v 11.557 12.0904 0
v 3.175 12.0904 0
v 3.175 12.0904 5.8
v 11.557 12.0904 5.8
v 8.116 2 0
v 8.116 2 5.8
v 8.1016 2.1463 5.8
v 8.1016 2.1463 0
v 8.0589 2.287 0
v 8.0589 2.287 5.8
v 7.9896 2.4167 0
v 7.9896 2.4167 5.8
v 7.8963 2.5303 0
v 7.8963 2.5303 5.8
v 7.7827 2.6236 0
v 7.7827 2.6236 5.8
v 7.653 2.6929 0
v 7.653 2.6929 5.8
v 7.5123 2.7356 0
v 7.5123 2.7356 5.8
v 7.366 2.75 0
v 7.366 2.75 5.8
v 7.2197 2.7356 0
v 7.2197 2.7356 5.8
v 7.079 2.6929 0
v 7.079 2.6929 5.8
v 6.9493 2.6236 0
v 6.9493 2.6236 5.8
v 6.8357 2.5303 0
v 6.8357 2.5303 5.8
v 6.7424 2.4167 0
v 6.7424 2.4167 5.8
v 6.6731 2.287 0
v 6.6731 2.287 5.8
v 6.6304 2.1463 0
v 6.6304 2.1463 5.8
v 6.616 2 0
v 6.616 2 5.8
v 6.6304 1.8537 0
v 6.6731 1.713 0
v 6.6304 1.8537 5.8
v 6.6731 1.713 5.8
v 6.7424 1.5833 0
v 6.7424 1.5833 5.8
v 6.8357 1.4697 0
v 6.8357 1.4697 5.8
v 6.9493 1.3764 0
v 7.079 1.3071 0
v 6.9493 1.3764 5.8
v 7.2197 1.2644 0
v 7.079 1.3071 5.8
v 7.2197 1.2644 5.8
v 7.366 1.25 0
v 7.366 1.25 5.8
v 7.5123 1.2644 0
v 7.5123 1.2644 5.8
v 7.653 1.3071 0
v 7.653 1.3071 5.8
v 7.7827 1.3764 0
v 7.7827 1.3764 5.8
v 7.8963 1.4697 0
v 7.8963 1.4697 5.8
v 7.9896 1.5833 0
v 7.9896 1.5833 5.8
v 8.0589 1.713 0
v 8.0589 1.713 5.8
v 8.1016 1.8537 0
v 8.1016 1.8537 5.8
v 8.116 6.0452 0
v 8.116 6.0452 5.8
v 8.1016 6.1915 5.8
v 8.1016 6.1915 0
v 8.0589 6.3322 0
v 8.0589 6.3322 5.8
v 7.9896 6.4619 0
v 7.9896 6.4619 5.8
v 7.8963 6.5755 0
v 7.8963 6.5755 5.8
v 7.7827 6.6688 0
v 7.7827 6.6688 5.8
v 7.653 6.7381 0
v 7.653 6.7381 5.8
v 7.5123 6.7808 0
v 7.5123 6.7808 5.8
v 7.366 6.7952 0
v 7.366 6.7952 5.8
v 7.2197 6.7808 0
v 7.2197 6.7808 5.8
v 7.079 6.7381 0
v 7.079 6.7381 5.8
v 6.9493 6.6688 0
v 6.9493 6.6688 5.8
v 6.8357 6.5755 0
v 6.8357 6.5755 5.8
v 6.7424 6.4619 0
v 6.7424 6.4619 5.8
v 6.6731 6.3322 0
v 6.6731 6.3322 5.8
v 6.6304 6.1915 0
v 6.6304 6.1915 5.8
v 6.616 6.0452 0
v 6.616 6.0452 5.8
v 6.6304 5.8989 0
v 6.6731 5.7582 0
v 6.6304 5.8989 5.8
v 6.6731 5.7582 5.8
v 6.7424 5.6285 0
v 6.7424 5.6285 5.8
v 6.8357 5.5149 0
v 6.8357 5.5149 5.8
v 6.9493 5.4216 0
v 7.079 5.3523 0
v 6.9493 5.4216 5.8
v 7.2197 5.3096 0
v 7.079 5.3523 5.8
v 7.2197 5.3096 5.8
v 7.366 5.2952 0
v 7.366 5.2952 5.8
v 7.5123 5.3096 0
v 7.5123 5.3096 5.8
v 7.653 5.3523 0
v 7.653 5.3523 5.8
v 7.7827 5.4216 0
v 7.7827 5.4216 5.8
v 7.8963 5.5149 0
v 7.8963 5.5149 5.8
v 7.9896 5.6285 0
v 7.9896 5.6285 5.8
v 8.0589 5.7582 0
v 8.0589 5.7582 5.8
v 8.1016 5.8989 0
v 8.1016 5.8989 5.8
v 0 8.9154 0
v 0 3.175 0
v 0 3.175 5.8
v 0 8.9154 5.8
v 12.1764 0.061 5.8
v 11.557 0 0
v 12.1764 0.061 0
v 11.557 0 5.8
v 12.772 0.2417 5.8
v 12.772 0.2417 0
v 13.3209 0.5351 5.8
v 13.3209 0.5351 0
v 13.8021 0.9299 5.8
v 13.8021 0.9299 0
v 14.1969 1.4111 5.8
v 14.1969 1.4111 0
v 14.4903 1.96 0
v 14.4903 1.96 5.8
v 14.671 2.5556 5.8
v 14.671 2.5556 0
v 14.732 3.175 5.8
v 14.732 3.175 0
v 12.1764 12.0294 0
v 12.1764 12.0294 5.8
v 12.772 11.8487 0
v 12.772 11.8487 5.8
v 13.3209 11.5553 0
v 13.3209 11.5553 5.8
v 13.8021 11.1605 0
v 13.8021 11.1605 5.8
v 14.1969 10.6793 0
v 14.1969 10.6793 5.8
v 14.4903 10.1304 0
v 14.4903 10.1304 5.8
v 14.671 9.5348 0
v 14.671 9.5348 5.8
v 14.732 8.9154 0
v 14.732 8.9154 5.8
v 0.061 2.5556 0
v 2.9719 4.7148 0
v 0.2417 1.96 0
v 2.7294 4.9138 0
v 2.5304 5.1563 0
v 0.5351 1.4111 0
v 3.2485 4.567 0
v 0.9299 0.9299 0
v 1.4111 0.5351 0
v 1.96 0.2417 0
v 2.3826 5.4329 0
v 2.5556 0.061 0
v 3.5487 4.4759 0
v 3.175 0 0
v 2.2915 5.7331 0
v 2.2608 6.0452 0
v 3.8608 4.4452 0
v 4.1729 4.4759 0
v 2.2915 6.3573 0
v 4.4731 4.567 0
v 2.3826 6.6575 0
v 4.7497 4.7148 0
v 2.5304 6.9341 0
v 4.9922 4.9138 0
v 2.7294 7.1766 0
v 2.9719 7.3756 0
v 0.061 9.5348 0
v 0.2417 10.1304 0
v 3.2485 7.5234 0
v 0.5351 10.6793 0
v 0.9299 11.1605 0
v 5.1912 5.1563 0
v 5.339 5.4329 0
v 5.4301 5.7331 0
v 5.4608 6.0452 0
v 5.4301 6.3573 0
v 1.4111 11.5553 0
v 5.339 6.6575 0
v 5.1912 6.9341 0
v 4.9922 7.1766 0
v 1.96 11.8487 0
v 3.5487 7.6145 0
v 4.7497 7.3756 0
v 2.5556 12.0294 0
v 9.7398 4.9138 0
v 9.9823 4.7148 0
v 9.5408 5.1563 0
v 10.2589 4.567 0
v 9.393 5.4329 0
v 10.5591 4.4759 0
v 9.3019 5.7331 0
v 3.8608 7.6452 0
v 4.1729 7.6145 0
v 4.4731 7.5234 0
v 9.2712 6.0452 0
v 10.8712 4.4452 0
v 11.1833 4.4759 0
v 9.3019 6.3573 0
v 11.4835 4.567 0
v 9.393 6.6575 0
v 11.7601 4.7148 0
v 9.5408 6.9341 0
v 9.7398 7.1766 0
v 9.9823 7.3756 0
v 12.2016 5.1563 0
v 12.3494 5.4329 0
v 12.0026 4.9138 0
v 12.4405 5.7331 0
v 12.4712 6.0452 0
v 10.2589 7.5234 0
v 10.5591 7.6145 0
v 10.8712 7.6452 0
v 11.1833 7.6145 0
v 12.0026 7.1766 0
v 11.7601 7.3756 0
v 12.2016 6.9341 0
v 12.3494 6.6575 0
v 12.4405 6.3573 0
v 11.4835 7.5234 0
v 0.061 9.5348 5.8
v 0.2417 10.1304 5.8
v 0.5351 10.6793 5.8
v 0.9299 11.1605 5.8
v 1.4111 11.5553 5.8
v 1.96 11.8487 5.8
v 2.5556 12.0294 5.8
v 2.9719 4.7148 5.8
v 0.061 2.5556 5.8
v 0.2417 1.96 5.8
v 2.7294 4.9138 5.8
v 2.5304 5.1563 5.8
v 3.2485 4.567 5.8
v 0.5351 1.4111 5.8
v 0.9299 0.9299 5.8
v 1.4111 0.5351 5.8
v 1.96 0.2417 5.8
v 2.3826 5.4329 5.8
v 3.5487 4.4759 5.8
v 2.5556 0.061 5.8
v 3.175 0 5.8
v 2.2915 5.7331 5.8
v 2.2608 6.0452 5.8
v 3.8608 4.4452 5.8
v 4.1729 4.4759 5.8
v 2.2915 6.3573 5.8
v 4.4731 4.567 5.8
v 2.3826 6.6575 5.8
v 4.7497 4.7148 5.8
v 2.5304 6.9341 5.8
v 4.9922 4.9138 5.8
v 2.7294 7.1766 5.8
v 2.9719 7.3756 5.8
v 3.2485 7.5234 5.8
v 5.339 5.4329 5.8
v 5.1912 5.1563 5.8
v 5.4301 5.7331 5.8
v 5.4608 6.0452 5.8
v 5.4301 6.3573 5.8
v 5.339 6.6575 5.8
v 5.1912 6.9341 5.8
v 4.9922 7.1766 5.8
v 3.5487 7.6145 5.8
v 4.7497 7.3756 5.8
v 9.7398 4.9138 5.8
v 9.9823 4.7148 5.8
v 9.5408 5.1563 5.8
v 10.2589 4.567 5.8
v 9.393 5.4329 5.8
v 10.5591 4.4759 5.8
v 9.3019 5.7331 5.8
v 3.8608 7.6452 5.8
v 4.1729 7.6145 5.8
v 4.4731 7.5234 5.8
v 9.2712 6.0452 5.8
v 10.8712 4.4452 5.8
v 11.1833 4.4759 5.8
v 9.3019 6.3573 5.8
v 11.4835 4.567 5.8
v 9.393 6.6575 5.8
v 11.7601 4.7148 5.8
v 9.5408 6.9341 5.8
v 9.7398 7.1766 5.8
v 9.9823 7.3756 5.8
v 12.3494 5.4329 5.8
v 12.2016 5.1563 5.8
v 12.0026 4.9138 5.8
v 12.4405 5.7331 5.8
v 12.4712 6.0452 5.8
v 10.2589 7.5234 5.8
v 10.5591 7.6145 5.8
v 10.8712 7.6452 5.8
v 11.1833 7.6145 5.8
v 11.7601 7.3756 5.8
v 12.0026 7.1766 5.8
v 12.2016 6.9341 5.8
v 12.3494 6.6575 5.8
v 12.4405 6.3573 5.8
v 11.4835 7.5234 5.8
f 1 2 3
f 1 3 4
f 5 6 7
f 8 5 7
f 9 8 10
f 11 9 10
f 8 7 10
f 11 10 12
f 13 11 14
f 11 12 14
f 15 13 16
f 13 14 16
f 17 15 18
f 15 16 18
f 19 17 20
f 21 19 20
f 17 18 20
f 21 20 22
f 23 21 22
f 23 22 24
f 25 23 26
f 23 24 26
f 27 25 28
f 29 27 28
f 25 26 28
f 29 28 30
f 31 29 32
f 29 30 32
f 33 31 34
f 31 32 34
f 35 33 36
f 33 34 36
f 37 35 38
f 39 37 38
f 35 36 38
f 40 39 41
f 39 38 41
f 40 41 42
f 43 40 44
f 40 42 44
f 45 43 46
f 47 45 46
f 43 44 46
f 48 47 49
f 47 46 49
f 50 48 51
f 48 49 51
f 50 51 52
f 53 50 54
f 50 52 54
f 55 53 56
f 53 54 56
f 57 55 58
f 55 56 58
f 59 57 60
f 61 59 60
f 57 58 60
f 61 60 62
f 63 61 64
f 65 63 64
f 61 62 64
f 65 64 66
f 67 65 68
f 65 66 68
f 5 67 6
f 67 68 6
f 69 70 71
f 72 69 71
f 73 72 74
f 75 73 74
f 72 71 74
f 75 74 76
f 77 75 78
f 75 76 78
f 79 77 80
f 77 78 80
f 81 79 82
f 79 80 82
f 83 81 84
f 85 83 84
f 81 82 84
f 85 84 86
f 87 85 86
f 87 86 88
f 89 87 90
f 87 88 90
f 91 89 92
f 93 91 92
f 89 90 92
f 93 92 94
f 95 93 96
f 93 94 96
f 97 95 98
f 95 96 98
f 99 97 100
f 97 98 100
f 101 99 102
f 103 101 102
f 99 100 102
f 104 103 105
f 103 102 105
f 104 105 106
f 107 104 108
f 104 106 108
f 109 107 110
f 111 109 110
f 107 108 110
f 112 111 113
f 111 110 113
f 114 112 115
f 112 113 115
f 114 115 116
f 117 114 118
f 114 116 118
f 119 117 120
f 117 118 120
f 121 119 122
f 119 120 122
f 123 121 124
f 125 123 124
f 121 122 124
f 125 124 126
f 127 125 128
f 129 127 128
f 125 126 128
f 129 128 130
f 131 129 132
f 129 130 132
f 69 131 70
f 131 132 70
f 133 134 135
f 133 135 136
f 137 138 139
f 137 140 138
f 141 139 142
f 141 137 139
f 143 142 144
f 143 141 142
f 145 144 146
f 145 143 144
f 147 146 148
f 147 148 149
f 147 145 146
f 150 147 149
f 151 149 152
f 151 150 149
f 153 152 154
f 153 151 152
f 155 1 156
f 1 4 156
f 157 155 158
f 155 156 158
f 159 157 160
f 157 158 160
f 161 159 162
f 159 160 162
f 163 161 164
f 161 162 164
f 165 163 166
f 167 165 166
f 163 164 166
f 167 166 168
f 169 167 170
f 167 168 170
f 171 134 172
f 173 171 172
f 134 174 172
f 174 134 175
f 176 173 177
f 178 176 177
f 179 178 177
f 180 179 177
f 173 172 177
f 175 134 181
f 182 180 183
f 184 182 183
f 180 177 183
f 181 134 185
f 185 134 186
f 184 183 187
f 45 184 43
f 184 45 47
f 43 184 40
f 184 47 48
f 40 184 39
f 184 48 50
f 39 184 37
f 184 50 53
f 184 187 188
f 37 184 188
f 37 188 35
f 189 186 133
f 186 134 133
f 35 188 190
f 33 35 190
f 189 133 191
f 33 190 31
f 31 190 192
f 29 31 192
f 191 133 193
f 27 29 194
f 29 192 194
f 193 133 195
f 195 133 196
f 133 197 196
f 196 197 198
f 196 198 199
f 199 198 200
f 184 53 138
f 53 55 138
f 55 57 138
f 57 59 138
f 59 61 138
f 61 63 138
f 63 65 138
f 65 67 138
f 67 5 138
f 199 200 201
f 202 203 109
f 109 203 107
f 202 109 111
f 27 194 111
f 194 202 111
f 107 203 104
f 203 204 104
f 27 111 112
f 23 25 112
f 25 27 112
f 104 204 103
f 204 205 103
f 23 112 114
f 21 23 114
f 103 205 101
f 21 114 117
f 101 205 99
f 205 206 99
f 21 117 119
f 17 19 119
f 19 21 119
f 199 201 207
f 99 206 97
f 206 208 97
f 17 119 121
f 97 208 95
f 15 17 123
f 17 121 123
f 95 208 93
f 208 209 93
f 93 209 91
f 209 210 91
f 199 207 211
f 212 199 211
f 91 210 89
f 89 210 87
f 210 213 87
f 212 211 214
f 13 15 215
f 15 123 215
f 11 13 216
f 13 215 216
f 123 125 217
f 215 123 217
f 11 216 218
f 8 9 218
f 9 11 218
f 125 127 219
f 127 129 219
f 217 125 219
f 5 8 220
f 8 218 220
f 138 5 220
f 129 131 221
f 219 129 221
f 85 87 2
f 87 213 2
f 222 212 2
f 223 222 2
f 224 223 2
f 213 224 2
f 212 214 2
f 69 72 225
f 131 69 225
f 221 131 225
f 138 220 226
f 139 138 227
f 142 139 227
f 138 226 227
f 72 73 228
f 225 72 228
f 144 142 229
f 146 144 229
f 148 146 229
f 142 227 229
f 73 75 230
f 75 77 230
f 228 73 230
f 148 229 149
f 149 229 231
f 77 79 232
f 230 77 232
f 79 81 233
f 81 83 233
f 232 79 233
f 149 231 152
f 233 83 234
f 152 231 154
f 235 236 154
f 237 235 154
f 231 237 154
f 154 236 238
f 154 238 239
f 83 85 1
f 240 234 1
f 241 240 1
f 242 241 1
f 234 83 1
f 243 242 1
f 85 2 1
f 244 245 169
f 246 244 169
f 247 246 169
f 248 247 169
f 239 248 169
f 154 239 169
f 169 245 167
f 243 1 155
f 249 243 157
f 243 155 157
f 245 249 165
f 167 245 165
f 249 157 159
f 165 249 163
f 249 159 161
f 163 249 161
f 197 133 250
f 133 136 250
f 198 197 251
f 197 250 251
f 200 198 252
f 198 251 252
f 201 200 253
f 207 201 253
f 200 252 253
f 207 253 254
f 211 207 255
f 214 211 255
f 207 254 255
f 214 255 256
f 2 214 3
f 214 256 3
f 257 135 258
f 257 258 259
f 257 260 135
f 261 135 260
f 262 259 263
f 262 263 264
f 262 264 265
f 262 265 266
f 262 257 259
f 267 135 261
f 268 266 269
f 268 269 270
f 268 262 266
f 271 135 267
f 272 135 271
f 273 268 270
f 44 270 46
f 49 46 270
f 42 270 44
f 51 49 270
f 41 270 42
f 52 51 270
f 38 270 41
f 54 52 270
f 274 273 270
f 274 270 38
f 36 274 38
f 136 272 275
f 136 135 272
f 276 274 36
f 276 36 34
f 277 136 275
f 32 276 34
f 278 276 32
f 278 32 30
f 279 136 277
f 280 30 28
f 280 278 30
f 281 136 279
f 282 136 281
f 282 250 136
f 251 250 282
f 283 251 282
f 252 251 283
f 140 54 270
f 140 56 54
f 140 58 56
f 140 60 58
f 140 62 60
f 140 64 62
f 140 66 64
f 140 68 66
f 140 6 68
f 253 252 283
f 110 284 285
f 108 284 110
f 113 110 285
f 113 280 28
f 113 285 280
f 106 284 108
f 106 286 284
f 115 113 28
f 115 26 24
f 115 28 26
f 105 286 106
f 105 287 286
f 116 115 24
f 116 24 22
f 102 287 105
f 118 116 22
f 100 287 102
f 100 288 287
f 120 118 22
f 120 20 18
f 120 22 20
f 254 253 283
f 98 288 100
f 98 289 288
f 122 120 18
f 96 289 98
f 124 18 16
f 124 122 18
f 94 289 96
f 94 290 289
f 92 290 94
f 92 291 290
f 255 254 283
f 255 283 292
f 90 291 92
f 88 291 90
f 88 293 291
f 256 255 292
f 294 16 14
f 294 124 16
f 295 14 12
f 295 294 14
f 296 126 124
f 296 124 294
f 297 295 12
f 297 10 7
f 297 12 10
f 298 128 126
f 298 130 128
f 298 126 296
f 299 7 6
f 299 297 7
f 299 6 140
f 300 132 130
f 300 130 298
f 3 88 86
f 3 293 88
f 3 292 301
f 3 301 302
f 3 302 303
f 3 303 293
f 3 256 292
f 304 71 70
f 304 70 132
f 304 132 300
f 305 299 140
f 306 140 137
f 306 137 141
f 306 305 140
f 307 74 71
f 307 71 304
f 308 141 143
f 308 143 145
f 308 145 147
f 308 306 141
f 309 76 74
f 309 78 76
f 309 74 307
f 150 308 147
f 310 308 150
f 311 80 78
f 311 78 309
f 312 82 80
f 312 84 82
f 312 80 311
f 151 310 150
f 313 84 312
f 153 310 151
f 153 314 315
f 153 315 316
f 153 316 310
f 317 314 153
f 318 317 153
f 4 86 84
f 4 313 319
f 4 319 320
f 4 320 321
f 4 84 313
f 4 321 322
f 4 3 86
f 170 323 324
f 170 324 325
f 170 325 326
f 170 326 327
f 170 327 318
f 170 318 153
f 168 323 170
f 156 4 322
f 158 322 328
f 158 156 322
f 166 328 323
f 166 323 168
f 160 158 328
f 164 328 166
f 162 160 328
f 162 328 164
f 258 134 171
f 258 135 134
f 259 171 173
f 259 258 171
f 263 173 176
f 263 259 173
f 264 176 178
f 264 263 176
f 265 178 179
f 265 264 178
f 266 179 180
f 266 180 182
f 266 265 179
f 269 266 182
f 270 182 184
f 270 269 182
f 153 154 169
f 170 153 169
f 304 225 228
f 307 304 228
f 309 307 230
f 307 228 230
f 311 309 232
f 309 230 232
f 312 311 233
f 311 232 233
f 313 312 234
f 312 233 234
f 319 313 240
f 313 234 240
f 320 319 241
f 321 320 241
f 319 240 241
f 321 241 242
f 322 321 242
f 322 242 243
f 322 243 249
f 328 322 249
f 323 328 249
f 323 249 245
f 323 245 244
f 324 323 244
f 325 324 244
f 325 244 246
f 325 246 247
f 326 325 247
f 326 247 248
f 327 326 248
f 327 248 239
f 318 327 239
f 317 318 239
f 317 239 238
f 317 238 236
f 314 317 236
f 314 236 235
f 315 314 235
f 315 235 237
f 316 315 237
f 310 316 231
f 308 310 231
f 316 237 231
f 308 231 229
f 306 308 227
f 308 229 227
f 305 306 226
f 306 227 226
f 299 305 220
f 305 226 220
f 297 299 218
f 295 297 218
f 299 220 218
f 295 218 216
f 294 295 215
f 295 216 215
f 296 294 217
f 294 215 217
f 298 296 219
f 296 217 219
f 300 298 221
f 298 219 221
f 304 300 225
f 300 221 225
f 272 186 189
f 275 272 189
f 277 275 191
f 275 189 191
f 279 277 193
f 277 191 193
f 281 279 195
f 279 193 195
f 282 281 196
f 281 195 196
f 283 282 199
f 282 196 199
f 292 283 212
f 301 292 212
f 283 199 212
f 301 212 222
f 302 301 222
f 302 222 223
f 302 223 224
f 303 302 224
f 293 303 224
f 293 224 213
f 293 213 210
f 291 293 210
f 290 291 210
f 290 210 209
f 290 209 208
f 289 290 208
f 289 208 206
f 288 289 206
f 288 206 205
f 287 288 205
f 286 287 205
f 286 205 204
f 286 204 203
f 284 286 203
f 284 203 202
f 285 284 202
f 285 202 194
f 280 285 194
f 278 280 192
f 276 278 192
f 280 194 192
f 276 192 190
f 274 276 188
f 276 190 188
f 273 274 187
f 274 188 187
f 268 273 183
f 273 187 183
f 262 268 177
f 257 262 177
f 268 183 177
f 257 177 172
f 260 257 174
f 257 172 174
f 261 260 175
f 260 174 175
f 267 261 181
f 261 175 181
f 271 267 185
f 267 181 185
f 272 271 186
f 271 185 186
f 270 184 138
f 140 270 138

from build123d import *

# Parameters (mm, degrees)
SKETCH1_W                = 14.732
SKETCH1_H                = 12.0904
BOSS_EXTRUDE1_DEPTH      = 5.8
SKETCH2_R                = 0.75
CUT_EXTRUDE1_DEPTH       = 5.8
M3_CLEARANCE_HOLE1_D     = 3.2
M3_CLEARANCE_HOLE1_DEPTH = 36.28
M3_CLEARANCE_HOLE1_TIP   = 0.96137699
FILLET1_R                = 3.175


with BuildPart() as part:
    # Sketch1 → Boss-Extrude1 (new body)
    with BuildSketch(Plane.XY):
        with Locations((7.366, 6.0452)):
            Rectangle(SKETCH1_W, SKETCH1_H)
    extrude(amount=BOSS_EXTRUDE1_DEPTH)

    # Sketch2 → Cut-Extrude1 (cut)
    with BuildSketch(Plane.XY.offset(5.8)):
        with Locations((7.366, 6.0452)):
            Circle(SKETCH2_R)
        with Locations((7.366, 2)):
            Circle(SKETCH2_R)
    extrude(amount=-CUT_EXTRUDE1_DEPTH, mode=Mode.SUBTRACT)

    # M3 Clearance Hole1
    with Locations(Plane.XY.offset(5.8)):
        with Locations((3.8608, 6.0452), (10.8712, 6.0452)):
            Hole(M3_CLEARANCE_HOLE1_D / 2, depth=M3_CLEARANCE_HOLE1_DEPTH)
            with Locations((0, 0, -(M3_CLEARANCE_HOLE1_DEPTH + M3_CLEARANCE_HOLE1_TIP / 2))):  # 118° drill point
                Cone(0, M3_CLEARANCE_HOLE1_D / 2, M3_CLEARANCE_HOLE1_TIP, mode=Mode.SUBTRACT)

    # Fillet1
    fillet1_edges = [part.edges().sort_by_distance(p)[0] for p in [
        (0, 12.0904, 2.9),
        (14.732, 12.0904, 2.9),
        (14.732, 0, 2.9),
        (0, 0, 2.9),
    ]]
    fillet(fillet1_edges, radius=FILLET1_R)


solid = part.part
